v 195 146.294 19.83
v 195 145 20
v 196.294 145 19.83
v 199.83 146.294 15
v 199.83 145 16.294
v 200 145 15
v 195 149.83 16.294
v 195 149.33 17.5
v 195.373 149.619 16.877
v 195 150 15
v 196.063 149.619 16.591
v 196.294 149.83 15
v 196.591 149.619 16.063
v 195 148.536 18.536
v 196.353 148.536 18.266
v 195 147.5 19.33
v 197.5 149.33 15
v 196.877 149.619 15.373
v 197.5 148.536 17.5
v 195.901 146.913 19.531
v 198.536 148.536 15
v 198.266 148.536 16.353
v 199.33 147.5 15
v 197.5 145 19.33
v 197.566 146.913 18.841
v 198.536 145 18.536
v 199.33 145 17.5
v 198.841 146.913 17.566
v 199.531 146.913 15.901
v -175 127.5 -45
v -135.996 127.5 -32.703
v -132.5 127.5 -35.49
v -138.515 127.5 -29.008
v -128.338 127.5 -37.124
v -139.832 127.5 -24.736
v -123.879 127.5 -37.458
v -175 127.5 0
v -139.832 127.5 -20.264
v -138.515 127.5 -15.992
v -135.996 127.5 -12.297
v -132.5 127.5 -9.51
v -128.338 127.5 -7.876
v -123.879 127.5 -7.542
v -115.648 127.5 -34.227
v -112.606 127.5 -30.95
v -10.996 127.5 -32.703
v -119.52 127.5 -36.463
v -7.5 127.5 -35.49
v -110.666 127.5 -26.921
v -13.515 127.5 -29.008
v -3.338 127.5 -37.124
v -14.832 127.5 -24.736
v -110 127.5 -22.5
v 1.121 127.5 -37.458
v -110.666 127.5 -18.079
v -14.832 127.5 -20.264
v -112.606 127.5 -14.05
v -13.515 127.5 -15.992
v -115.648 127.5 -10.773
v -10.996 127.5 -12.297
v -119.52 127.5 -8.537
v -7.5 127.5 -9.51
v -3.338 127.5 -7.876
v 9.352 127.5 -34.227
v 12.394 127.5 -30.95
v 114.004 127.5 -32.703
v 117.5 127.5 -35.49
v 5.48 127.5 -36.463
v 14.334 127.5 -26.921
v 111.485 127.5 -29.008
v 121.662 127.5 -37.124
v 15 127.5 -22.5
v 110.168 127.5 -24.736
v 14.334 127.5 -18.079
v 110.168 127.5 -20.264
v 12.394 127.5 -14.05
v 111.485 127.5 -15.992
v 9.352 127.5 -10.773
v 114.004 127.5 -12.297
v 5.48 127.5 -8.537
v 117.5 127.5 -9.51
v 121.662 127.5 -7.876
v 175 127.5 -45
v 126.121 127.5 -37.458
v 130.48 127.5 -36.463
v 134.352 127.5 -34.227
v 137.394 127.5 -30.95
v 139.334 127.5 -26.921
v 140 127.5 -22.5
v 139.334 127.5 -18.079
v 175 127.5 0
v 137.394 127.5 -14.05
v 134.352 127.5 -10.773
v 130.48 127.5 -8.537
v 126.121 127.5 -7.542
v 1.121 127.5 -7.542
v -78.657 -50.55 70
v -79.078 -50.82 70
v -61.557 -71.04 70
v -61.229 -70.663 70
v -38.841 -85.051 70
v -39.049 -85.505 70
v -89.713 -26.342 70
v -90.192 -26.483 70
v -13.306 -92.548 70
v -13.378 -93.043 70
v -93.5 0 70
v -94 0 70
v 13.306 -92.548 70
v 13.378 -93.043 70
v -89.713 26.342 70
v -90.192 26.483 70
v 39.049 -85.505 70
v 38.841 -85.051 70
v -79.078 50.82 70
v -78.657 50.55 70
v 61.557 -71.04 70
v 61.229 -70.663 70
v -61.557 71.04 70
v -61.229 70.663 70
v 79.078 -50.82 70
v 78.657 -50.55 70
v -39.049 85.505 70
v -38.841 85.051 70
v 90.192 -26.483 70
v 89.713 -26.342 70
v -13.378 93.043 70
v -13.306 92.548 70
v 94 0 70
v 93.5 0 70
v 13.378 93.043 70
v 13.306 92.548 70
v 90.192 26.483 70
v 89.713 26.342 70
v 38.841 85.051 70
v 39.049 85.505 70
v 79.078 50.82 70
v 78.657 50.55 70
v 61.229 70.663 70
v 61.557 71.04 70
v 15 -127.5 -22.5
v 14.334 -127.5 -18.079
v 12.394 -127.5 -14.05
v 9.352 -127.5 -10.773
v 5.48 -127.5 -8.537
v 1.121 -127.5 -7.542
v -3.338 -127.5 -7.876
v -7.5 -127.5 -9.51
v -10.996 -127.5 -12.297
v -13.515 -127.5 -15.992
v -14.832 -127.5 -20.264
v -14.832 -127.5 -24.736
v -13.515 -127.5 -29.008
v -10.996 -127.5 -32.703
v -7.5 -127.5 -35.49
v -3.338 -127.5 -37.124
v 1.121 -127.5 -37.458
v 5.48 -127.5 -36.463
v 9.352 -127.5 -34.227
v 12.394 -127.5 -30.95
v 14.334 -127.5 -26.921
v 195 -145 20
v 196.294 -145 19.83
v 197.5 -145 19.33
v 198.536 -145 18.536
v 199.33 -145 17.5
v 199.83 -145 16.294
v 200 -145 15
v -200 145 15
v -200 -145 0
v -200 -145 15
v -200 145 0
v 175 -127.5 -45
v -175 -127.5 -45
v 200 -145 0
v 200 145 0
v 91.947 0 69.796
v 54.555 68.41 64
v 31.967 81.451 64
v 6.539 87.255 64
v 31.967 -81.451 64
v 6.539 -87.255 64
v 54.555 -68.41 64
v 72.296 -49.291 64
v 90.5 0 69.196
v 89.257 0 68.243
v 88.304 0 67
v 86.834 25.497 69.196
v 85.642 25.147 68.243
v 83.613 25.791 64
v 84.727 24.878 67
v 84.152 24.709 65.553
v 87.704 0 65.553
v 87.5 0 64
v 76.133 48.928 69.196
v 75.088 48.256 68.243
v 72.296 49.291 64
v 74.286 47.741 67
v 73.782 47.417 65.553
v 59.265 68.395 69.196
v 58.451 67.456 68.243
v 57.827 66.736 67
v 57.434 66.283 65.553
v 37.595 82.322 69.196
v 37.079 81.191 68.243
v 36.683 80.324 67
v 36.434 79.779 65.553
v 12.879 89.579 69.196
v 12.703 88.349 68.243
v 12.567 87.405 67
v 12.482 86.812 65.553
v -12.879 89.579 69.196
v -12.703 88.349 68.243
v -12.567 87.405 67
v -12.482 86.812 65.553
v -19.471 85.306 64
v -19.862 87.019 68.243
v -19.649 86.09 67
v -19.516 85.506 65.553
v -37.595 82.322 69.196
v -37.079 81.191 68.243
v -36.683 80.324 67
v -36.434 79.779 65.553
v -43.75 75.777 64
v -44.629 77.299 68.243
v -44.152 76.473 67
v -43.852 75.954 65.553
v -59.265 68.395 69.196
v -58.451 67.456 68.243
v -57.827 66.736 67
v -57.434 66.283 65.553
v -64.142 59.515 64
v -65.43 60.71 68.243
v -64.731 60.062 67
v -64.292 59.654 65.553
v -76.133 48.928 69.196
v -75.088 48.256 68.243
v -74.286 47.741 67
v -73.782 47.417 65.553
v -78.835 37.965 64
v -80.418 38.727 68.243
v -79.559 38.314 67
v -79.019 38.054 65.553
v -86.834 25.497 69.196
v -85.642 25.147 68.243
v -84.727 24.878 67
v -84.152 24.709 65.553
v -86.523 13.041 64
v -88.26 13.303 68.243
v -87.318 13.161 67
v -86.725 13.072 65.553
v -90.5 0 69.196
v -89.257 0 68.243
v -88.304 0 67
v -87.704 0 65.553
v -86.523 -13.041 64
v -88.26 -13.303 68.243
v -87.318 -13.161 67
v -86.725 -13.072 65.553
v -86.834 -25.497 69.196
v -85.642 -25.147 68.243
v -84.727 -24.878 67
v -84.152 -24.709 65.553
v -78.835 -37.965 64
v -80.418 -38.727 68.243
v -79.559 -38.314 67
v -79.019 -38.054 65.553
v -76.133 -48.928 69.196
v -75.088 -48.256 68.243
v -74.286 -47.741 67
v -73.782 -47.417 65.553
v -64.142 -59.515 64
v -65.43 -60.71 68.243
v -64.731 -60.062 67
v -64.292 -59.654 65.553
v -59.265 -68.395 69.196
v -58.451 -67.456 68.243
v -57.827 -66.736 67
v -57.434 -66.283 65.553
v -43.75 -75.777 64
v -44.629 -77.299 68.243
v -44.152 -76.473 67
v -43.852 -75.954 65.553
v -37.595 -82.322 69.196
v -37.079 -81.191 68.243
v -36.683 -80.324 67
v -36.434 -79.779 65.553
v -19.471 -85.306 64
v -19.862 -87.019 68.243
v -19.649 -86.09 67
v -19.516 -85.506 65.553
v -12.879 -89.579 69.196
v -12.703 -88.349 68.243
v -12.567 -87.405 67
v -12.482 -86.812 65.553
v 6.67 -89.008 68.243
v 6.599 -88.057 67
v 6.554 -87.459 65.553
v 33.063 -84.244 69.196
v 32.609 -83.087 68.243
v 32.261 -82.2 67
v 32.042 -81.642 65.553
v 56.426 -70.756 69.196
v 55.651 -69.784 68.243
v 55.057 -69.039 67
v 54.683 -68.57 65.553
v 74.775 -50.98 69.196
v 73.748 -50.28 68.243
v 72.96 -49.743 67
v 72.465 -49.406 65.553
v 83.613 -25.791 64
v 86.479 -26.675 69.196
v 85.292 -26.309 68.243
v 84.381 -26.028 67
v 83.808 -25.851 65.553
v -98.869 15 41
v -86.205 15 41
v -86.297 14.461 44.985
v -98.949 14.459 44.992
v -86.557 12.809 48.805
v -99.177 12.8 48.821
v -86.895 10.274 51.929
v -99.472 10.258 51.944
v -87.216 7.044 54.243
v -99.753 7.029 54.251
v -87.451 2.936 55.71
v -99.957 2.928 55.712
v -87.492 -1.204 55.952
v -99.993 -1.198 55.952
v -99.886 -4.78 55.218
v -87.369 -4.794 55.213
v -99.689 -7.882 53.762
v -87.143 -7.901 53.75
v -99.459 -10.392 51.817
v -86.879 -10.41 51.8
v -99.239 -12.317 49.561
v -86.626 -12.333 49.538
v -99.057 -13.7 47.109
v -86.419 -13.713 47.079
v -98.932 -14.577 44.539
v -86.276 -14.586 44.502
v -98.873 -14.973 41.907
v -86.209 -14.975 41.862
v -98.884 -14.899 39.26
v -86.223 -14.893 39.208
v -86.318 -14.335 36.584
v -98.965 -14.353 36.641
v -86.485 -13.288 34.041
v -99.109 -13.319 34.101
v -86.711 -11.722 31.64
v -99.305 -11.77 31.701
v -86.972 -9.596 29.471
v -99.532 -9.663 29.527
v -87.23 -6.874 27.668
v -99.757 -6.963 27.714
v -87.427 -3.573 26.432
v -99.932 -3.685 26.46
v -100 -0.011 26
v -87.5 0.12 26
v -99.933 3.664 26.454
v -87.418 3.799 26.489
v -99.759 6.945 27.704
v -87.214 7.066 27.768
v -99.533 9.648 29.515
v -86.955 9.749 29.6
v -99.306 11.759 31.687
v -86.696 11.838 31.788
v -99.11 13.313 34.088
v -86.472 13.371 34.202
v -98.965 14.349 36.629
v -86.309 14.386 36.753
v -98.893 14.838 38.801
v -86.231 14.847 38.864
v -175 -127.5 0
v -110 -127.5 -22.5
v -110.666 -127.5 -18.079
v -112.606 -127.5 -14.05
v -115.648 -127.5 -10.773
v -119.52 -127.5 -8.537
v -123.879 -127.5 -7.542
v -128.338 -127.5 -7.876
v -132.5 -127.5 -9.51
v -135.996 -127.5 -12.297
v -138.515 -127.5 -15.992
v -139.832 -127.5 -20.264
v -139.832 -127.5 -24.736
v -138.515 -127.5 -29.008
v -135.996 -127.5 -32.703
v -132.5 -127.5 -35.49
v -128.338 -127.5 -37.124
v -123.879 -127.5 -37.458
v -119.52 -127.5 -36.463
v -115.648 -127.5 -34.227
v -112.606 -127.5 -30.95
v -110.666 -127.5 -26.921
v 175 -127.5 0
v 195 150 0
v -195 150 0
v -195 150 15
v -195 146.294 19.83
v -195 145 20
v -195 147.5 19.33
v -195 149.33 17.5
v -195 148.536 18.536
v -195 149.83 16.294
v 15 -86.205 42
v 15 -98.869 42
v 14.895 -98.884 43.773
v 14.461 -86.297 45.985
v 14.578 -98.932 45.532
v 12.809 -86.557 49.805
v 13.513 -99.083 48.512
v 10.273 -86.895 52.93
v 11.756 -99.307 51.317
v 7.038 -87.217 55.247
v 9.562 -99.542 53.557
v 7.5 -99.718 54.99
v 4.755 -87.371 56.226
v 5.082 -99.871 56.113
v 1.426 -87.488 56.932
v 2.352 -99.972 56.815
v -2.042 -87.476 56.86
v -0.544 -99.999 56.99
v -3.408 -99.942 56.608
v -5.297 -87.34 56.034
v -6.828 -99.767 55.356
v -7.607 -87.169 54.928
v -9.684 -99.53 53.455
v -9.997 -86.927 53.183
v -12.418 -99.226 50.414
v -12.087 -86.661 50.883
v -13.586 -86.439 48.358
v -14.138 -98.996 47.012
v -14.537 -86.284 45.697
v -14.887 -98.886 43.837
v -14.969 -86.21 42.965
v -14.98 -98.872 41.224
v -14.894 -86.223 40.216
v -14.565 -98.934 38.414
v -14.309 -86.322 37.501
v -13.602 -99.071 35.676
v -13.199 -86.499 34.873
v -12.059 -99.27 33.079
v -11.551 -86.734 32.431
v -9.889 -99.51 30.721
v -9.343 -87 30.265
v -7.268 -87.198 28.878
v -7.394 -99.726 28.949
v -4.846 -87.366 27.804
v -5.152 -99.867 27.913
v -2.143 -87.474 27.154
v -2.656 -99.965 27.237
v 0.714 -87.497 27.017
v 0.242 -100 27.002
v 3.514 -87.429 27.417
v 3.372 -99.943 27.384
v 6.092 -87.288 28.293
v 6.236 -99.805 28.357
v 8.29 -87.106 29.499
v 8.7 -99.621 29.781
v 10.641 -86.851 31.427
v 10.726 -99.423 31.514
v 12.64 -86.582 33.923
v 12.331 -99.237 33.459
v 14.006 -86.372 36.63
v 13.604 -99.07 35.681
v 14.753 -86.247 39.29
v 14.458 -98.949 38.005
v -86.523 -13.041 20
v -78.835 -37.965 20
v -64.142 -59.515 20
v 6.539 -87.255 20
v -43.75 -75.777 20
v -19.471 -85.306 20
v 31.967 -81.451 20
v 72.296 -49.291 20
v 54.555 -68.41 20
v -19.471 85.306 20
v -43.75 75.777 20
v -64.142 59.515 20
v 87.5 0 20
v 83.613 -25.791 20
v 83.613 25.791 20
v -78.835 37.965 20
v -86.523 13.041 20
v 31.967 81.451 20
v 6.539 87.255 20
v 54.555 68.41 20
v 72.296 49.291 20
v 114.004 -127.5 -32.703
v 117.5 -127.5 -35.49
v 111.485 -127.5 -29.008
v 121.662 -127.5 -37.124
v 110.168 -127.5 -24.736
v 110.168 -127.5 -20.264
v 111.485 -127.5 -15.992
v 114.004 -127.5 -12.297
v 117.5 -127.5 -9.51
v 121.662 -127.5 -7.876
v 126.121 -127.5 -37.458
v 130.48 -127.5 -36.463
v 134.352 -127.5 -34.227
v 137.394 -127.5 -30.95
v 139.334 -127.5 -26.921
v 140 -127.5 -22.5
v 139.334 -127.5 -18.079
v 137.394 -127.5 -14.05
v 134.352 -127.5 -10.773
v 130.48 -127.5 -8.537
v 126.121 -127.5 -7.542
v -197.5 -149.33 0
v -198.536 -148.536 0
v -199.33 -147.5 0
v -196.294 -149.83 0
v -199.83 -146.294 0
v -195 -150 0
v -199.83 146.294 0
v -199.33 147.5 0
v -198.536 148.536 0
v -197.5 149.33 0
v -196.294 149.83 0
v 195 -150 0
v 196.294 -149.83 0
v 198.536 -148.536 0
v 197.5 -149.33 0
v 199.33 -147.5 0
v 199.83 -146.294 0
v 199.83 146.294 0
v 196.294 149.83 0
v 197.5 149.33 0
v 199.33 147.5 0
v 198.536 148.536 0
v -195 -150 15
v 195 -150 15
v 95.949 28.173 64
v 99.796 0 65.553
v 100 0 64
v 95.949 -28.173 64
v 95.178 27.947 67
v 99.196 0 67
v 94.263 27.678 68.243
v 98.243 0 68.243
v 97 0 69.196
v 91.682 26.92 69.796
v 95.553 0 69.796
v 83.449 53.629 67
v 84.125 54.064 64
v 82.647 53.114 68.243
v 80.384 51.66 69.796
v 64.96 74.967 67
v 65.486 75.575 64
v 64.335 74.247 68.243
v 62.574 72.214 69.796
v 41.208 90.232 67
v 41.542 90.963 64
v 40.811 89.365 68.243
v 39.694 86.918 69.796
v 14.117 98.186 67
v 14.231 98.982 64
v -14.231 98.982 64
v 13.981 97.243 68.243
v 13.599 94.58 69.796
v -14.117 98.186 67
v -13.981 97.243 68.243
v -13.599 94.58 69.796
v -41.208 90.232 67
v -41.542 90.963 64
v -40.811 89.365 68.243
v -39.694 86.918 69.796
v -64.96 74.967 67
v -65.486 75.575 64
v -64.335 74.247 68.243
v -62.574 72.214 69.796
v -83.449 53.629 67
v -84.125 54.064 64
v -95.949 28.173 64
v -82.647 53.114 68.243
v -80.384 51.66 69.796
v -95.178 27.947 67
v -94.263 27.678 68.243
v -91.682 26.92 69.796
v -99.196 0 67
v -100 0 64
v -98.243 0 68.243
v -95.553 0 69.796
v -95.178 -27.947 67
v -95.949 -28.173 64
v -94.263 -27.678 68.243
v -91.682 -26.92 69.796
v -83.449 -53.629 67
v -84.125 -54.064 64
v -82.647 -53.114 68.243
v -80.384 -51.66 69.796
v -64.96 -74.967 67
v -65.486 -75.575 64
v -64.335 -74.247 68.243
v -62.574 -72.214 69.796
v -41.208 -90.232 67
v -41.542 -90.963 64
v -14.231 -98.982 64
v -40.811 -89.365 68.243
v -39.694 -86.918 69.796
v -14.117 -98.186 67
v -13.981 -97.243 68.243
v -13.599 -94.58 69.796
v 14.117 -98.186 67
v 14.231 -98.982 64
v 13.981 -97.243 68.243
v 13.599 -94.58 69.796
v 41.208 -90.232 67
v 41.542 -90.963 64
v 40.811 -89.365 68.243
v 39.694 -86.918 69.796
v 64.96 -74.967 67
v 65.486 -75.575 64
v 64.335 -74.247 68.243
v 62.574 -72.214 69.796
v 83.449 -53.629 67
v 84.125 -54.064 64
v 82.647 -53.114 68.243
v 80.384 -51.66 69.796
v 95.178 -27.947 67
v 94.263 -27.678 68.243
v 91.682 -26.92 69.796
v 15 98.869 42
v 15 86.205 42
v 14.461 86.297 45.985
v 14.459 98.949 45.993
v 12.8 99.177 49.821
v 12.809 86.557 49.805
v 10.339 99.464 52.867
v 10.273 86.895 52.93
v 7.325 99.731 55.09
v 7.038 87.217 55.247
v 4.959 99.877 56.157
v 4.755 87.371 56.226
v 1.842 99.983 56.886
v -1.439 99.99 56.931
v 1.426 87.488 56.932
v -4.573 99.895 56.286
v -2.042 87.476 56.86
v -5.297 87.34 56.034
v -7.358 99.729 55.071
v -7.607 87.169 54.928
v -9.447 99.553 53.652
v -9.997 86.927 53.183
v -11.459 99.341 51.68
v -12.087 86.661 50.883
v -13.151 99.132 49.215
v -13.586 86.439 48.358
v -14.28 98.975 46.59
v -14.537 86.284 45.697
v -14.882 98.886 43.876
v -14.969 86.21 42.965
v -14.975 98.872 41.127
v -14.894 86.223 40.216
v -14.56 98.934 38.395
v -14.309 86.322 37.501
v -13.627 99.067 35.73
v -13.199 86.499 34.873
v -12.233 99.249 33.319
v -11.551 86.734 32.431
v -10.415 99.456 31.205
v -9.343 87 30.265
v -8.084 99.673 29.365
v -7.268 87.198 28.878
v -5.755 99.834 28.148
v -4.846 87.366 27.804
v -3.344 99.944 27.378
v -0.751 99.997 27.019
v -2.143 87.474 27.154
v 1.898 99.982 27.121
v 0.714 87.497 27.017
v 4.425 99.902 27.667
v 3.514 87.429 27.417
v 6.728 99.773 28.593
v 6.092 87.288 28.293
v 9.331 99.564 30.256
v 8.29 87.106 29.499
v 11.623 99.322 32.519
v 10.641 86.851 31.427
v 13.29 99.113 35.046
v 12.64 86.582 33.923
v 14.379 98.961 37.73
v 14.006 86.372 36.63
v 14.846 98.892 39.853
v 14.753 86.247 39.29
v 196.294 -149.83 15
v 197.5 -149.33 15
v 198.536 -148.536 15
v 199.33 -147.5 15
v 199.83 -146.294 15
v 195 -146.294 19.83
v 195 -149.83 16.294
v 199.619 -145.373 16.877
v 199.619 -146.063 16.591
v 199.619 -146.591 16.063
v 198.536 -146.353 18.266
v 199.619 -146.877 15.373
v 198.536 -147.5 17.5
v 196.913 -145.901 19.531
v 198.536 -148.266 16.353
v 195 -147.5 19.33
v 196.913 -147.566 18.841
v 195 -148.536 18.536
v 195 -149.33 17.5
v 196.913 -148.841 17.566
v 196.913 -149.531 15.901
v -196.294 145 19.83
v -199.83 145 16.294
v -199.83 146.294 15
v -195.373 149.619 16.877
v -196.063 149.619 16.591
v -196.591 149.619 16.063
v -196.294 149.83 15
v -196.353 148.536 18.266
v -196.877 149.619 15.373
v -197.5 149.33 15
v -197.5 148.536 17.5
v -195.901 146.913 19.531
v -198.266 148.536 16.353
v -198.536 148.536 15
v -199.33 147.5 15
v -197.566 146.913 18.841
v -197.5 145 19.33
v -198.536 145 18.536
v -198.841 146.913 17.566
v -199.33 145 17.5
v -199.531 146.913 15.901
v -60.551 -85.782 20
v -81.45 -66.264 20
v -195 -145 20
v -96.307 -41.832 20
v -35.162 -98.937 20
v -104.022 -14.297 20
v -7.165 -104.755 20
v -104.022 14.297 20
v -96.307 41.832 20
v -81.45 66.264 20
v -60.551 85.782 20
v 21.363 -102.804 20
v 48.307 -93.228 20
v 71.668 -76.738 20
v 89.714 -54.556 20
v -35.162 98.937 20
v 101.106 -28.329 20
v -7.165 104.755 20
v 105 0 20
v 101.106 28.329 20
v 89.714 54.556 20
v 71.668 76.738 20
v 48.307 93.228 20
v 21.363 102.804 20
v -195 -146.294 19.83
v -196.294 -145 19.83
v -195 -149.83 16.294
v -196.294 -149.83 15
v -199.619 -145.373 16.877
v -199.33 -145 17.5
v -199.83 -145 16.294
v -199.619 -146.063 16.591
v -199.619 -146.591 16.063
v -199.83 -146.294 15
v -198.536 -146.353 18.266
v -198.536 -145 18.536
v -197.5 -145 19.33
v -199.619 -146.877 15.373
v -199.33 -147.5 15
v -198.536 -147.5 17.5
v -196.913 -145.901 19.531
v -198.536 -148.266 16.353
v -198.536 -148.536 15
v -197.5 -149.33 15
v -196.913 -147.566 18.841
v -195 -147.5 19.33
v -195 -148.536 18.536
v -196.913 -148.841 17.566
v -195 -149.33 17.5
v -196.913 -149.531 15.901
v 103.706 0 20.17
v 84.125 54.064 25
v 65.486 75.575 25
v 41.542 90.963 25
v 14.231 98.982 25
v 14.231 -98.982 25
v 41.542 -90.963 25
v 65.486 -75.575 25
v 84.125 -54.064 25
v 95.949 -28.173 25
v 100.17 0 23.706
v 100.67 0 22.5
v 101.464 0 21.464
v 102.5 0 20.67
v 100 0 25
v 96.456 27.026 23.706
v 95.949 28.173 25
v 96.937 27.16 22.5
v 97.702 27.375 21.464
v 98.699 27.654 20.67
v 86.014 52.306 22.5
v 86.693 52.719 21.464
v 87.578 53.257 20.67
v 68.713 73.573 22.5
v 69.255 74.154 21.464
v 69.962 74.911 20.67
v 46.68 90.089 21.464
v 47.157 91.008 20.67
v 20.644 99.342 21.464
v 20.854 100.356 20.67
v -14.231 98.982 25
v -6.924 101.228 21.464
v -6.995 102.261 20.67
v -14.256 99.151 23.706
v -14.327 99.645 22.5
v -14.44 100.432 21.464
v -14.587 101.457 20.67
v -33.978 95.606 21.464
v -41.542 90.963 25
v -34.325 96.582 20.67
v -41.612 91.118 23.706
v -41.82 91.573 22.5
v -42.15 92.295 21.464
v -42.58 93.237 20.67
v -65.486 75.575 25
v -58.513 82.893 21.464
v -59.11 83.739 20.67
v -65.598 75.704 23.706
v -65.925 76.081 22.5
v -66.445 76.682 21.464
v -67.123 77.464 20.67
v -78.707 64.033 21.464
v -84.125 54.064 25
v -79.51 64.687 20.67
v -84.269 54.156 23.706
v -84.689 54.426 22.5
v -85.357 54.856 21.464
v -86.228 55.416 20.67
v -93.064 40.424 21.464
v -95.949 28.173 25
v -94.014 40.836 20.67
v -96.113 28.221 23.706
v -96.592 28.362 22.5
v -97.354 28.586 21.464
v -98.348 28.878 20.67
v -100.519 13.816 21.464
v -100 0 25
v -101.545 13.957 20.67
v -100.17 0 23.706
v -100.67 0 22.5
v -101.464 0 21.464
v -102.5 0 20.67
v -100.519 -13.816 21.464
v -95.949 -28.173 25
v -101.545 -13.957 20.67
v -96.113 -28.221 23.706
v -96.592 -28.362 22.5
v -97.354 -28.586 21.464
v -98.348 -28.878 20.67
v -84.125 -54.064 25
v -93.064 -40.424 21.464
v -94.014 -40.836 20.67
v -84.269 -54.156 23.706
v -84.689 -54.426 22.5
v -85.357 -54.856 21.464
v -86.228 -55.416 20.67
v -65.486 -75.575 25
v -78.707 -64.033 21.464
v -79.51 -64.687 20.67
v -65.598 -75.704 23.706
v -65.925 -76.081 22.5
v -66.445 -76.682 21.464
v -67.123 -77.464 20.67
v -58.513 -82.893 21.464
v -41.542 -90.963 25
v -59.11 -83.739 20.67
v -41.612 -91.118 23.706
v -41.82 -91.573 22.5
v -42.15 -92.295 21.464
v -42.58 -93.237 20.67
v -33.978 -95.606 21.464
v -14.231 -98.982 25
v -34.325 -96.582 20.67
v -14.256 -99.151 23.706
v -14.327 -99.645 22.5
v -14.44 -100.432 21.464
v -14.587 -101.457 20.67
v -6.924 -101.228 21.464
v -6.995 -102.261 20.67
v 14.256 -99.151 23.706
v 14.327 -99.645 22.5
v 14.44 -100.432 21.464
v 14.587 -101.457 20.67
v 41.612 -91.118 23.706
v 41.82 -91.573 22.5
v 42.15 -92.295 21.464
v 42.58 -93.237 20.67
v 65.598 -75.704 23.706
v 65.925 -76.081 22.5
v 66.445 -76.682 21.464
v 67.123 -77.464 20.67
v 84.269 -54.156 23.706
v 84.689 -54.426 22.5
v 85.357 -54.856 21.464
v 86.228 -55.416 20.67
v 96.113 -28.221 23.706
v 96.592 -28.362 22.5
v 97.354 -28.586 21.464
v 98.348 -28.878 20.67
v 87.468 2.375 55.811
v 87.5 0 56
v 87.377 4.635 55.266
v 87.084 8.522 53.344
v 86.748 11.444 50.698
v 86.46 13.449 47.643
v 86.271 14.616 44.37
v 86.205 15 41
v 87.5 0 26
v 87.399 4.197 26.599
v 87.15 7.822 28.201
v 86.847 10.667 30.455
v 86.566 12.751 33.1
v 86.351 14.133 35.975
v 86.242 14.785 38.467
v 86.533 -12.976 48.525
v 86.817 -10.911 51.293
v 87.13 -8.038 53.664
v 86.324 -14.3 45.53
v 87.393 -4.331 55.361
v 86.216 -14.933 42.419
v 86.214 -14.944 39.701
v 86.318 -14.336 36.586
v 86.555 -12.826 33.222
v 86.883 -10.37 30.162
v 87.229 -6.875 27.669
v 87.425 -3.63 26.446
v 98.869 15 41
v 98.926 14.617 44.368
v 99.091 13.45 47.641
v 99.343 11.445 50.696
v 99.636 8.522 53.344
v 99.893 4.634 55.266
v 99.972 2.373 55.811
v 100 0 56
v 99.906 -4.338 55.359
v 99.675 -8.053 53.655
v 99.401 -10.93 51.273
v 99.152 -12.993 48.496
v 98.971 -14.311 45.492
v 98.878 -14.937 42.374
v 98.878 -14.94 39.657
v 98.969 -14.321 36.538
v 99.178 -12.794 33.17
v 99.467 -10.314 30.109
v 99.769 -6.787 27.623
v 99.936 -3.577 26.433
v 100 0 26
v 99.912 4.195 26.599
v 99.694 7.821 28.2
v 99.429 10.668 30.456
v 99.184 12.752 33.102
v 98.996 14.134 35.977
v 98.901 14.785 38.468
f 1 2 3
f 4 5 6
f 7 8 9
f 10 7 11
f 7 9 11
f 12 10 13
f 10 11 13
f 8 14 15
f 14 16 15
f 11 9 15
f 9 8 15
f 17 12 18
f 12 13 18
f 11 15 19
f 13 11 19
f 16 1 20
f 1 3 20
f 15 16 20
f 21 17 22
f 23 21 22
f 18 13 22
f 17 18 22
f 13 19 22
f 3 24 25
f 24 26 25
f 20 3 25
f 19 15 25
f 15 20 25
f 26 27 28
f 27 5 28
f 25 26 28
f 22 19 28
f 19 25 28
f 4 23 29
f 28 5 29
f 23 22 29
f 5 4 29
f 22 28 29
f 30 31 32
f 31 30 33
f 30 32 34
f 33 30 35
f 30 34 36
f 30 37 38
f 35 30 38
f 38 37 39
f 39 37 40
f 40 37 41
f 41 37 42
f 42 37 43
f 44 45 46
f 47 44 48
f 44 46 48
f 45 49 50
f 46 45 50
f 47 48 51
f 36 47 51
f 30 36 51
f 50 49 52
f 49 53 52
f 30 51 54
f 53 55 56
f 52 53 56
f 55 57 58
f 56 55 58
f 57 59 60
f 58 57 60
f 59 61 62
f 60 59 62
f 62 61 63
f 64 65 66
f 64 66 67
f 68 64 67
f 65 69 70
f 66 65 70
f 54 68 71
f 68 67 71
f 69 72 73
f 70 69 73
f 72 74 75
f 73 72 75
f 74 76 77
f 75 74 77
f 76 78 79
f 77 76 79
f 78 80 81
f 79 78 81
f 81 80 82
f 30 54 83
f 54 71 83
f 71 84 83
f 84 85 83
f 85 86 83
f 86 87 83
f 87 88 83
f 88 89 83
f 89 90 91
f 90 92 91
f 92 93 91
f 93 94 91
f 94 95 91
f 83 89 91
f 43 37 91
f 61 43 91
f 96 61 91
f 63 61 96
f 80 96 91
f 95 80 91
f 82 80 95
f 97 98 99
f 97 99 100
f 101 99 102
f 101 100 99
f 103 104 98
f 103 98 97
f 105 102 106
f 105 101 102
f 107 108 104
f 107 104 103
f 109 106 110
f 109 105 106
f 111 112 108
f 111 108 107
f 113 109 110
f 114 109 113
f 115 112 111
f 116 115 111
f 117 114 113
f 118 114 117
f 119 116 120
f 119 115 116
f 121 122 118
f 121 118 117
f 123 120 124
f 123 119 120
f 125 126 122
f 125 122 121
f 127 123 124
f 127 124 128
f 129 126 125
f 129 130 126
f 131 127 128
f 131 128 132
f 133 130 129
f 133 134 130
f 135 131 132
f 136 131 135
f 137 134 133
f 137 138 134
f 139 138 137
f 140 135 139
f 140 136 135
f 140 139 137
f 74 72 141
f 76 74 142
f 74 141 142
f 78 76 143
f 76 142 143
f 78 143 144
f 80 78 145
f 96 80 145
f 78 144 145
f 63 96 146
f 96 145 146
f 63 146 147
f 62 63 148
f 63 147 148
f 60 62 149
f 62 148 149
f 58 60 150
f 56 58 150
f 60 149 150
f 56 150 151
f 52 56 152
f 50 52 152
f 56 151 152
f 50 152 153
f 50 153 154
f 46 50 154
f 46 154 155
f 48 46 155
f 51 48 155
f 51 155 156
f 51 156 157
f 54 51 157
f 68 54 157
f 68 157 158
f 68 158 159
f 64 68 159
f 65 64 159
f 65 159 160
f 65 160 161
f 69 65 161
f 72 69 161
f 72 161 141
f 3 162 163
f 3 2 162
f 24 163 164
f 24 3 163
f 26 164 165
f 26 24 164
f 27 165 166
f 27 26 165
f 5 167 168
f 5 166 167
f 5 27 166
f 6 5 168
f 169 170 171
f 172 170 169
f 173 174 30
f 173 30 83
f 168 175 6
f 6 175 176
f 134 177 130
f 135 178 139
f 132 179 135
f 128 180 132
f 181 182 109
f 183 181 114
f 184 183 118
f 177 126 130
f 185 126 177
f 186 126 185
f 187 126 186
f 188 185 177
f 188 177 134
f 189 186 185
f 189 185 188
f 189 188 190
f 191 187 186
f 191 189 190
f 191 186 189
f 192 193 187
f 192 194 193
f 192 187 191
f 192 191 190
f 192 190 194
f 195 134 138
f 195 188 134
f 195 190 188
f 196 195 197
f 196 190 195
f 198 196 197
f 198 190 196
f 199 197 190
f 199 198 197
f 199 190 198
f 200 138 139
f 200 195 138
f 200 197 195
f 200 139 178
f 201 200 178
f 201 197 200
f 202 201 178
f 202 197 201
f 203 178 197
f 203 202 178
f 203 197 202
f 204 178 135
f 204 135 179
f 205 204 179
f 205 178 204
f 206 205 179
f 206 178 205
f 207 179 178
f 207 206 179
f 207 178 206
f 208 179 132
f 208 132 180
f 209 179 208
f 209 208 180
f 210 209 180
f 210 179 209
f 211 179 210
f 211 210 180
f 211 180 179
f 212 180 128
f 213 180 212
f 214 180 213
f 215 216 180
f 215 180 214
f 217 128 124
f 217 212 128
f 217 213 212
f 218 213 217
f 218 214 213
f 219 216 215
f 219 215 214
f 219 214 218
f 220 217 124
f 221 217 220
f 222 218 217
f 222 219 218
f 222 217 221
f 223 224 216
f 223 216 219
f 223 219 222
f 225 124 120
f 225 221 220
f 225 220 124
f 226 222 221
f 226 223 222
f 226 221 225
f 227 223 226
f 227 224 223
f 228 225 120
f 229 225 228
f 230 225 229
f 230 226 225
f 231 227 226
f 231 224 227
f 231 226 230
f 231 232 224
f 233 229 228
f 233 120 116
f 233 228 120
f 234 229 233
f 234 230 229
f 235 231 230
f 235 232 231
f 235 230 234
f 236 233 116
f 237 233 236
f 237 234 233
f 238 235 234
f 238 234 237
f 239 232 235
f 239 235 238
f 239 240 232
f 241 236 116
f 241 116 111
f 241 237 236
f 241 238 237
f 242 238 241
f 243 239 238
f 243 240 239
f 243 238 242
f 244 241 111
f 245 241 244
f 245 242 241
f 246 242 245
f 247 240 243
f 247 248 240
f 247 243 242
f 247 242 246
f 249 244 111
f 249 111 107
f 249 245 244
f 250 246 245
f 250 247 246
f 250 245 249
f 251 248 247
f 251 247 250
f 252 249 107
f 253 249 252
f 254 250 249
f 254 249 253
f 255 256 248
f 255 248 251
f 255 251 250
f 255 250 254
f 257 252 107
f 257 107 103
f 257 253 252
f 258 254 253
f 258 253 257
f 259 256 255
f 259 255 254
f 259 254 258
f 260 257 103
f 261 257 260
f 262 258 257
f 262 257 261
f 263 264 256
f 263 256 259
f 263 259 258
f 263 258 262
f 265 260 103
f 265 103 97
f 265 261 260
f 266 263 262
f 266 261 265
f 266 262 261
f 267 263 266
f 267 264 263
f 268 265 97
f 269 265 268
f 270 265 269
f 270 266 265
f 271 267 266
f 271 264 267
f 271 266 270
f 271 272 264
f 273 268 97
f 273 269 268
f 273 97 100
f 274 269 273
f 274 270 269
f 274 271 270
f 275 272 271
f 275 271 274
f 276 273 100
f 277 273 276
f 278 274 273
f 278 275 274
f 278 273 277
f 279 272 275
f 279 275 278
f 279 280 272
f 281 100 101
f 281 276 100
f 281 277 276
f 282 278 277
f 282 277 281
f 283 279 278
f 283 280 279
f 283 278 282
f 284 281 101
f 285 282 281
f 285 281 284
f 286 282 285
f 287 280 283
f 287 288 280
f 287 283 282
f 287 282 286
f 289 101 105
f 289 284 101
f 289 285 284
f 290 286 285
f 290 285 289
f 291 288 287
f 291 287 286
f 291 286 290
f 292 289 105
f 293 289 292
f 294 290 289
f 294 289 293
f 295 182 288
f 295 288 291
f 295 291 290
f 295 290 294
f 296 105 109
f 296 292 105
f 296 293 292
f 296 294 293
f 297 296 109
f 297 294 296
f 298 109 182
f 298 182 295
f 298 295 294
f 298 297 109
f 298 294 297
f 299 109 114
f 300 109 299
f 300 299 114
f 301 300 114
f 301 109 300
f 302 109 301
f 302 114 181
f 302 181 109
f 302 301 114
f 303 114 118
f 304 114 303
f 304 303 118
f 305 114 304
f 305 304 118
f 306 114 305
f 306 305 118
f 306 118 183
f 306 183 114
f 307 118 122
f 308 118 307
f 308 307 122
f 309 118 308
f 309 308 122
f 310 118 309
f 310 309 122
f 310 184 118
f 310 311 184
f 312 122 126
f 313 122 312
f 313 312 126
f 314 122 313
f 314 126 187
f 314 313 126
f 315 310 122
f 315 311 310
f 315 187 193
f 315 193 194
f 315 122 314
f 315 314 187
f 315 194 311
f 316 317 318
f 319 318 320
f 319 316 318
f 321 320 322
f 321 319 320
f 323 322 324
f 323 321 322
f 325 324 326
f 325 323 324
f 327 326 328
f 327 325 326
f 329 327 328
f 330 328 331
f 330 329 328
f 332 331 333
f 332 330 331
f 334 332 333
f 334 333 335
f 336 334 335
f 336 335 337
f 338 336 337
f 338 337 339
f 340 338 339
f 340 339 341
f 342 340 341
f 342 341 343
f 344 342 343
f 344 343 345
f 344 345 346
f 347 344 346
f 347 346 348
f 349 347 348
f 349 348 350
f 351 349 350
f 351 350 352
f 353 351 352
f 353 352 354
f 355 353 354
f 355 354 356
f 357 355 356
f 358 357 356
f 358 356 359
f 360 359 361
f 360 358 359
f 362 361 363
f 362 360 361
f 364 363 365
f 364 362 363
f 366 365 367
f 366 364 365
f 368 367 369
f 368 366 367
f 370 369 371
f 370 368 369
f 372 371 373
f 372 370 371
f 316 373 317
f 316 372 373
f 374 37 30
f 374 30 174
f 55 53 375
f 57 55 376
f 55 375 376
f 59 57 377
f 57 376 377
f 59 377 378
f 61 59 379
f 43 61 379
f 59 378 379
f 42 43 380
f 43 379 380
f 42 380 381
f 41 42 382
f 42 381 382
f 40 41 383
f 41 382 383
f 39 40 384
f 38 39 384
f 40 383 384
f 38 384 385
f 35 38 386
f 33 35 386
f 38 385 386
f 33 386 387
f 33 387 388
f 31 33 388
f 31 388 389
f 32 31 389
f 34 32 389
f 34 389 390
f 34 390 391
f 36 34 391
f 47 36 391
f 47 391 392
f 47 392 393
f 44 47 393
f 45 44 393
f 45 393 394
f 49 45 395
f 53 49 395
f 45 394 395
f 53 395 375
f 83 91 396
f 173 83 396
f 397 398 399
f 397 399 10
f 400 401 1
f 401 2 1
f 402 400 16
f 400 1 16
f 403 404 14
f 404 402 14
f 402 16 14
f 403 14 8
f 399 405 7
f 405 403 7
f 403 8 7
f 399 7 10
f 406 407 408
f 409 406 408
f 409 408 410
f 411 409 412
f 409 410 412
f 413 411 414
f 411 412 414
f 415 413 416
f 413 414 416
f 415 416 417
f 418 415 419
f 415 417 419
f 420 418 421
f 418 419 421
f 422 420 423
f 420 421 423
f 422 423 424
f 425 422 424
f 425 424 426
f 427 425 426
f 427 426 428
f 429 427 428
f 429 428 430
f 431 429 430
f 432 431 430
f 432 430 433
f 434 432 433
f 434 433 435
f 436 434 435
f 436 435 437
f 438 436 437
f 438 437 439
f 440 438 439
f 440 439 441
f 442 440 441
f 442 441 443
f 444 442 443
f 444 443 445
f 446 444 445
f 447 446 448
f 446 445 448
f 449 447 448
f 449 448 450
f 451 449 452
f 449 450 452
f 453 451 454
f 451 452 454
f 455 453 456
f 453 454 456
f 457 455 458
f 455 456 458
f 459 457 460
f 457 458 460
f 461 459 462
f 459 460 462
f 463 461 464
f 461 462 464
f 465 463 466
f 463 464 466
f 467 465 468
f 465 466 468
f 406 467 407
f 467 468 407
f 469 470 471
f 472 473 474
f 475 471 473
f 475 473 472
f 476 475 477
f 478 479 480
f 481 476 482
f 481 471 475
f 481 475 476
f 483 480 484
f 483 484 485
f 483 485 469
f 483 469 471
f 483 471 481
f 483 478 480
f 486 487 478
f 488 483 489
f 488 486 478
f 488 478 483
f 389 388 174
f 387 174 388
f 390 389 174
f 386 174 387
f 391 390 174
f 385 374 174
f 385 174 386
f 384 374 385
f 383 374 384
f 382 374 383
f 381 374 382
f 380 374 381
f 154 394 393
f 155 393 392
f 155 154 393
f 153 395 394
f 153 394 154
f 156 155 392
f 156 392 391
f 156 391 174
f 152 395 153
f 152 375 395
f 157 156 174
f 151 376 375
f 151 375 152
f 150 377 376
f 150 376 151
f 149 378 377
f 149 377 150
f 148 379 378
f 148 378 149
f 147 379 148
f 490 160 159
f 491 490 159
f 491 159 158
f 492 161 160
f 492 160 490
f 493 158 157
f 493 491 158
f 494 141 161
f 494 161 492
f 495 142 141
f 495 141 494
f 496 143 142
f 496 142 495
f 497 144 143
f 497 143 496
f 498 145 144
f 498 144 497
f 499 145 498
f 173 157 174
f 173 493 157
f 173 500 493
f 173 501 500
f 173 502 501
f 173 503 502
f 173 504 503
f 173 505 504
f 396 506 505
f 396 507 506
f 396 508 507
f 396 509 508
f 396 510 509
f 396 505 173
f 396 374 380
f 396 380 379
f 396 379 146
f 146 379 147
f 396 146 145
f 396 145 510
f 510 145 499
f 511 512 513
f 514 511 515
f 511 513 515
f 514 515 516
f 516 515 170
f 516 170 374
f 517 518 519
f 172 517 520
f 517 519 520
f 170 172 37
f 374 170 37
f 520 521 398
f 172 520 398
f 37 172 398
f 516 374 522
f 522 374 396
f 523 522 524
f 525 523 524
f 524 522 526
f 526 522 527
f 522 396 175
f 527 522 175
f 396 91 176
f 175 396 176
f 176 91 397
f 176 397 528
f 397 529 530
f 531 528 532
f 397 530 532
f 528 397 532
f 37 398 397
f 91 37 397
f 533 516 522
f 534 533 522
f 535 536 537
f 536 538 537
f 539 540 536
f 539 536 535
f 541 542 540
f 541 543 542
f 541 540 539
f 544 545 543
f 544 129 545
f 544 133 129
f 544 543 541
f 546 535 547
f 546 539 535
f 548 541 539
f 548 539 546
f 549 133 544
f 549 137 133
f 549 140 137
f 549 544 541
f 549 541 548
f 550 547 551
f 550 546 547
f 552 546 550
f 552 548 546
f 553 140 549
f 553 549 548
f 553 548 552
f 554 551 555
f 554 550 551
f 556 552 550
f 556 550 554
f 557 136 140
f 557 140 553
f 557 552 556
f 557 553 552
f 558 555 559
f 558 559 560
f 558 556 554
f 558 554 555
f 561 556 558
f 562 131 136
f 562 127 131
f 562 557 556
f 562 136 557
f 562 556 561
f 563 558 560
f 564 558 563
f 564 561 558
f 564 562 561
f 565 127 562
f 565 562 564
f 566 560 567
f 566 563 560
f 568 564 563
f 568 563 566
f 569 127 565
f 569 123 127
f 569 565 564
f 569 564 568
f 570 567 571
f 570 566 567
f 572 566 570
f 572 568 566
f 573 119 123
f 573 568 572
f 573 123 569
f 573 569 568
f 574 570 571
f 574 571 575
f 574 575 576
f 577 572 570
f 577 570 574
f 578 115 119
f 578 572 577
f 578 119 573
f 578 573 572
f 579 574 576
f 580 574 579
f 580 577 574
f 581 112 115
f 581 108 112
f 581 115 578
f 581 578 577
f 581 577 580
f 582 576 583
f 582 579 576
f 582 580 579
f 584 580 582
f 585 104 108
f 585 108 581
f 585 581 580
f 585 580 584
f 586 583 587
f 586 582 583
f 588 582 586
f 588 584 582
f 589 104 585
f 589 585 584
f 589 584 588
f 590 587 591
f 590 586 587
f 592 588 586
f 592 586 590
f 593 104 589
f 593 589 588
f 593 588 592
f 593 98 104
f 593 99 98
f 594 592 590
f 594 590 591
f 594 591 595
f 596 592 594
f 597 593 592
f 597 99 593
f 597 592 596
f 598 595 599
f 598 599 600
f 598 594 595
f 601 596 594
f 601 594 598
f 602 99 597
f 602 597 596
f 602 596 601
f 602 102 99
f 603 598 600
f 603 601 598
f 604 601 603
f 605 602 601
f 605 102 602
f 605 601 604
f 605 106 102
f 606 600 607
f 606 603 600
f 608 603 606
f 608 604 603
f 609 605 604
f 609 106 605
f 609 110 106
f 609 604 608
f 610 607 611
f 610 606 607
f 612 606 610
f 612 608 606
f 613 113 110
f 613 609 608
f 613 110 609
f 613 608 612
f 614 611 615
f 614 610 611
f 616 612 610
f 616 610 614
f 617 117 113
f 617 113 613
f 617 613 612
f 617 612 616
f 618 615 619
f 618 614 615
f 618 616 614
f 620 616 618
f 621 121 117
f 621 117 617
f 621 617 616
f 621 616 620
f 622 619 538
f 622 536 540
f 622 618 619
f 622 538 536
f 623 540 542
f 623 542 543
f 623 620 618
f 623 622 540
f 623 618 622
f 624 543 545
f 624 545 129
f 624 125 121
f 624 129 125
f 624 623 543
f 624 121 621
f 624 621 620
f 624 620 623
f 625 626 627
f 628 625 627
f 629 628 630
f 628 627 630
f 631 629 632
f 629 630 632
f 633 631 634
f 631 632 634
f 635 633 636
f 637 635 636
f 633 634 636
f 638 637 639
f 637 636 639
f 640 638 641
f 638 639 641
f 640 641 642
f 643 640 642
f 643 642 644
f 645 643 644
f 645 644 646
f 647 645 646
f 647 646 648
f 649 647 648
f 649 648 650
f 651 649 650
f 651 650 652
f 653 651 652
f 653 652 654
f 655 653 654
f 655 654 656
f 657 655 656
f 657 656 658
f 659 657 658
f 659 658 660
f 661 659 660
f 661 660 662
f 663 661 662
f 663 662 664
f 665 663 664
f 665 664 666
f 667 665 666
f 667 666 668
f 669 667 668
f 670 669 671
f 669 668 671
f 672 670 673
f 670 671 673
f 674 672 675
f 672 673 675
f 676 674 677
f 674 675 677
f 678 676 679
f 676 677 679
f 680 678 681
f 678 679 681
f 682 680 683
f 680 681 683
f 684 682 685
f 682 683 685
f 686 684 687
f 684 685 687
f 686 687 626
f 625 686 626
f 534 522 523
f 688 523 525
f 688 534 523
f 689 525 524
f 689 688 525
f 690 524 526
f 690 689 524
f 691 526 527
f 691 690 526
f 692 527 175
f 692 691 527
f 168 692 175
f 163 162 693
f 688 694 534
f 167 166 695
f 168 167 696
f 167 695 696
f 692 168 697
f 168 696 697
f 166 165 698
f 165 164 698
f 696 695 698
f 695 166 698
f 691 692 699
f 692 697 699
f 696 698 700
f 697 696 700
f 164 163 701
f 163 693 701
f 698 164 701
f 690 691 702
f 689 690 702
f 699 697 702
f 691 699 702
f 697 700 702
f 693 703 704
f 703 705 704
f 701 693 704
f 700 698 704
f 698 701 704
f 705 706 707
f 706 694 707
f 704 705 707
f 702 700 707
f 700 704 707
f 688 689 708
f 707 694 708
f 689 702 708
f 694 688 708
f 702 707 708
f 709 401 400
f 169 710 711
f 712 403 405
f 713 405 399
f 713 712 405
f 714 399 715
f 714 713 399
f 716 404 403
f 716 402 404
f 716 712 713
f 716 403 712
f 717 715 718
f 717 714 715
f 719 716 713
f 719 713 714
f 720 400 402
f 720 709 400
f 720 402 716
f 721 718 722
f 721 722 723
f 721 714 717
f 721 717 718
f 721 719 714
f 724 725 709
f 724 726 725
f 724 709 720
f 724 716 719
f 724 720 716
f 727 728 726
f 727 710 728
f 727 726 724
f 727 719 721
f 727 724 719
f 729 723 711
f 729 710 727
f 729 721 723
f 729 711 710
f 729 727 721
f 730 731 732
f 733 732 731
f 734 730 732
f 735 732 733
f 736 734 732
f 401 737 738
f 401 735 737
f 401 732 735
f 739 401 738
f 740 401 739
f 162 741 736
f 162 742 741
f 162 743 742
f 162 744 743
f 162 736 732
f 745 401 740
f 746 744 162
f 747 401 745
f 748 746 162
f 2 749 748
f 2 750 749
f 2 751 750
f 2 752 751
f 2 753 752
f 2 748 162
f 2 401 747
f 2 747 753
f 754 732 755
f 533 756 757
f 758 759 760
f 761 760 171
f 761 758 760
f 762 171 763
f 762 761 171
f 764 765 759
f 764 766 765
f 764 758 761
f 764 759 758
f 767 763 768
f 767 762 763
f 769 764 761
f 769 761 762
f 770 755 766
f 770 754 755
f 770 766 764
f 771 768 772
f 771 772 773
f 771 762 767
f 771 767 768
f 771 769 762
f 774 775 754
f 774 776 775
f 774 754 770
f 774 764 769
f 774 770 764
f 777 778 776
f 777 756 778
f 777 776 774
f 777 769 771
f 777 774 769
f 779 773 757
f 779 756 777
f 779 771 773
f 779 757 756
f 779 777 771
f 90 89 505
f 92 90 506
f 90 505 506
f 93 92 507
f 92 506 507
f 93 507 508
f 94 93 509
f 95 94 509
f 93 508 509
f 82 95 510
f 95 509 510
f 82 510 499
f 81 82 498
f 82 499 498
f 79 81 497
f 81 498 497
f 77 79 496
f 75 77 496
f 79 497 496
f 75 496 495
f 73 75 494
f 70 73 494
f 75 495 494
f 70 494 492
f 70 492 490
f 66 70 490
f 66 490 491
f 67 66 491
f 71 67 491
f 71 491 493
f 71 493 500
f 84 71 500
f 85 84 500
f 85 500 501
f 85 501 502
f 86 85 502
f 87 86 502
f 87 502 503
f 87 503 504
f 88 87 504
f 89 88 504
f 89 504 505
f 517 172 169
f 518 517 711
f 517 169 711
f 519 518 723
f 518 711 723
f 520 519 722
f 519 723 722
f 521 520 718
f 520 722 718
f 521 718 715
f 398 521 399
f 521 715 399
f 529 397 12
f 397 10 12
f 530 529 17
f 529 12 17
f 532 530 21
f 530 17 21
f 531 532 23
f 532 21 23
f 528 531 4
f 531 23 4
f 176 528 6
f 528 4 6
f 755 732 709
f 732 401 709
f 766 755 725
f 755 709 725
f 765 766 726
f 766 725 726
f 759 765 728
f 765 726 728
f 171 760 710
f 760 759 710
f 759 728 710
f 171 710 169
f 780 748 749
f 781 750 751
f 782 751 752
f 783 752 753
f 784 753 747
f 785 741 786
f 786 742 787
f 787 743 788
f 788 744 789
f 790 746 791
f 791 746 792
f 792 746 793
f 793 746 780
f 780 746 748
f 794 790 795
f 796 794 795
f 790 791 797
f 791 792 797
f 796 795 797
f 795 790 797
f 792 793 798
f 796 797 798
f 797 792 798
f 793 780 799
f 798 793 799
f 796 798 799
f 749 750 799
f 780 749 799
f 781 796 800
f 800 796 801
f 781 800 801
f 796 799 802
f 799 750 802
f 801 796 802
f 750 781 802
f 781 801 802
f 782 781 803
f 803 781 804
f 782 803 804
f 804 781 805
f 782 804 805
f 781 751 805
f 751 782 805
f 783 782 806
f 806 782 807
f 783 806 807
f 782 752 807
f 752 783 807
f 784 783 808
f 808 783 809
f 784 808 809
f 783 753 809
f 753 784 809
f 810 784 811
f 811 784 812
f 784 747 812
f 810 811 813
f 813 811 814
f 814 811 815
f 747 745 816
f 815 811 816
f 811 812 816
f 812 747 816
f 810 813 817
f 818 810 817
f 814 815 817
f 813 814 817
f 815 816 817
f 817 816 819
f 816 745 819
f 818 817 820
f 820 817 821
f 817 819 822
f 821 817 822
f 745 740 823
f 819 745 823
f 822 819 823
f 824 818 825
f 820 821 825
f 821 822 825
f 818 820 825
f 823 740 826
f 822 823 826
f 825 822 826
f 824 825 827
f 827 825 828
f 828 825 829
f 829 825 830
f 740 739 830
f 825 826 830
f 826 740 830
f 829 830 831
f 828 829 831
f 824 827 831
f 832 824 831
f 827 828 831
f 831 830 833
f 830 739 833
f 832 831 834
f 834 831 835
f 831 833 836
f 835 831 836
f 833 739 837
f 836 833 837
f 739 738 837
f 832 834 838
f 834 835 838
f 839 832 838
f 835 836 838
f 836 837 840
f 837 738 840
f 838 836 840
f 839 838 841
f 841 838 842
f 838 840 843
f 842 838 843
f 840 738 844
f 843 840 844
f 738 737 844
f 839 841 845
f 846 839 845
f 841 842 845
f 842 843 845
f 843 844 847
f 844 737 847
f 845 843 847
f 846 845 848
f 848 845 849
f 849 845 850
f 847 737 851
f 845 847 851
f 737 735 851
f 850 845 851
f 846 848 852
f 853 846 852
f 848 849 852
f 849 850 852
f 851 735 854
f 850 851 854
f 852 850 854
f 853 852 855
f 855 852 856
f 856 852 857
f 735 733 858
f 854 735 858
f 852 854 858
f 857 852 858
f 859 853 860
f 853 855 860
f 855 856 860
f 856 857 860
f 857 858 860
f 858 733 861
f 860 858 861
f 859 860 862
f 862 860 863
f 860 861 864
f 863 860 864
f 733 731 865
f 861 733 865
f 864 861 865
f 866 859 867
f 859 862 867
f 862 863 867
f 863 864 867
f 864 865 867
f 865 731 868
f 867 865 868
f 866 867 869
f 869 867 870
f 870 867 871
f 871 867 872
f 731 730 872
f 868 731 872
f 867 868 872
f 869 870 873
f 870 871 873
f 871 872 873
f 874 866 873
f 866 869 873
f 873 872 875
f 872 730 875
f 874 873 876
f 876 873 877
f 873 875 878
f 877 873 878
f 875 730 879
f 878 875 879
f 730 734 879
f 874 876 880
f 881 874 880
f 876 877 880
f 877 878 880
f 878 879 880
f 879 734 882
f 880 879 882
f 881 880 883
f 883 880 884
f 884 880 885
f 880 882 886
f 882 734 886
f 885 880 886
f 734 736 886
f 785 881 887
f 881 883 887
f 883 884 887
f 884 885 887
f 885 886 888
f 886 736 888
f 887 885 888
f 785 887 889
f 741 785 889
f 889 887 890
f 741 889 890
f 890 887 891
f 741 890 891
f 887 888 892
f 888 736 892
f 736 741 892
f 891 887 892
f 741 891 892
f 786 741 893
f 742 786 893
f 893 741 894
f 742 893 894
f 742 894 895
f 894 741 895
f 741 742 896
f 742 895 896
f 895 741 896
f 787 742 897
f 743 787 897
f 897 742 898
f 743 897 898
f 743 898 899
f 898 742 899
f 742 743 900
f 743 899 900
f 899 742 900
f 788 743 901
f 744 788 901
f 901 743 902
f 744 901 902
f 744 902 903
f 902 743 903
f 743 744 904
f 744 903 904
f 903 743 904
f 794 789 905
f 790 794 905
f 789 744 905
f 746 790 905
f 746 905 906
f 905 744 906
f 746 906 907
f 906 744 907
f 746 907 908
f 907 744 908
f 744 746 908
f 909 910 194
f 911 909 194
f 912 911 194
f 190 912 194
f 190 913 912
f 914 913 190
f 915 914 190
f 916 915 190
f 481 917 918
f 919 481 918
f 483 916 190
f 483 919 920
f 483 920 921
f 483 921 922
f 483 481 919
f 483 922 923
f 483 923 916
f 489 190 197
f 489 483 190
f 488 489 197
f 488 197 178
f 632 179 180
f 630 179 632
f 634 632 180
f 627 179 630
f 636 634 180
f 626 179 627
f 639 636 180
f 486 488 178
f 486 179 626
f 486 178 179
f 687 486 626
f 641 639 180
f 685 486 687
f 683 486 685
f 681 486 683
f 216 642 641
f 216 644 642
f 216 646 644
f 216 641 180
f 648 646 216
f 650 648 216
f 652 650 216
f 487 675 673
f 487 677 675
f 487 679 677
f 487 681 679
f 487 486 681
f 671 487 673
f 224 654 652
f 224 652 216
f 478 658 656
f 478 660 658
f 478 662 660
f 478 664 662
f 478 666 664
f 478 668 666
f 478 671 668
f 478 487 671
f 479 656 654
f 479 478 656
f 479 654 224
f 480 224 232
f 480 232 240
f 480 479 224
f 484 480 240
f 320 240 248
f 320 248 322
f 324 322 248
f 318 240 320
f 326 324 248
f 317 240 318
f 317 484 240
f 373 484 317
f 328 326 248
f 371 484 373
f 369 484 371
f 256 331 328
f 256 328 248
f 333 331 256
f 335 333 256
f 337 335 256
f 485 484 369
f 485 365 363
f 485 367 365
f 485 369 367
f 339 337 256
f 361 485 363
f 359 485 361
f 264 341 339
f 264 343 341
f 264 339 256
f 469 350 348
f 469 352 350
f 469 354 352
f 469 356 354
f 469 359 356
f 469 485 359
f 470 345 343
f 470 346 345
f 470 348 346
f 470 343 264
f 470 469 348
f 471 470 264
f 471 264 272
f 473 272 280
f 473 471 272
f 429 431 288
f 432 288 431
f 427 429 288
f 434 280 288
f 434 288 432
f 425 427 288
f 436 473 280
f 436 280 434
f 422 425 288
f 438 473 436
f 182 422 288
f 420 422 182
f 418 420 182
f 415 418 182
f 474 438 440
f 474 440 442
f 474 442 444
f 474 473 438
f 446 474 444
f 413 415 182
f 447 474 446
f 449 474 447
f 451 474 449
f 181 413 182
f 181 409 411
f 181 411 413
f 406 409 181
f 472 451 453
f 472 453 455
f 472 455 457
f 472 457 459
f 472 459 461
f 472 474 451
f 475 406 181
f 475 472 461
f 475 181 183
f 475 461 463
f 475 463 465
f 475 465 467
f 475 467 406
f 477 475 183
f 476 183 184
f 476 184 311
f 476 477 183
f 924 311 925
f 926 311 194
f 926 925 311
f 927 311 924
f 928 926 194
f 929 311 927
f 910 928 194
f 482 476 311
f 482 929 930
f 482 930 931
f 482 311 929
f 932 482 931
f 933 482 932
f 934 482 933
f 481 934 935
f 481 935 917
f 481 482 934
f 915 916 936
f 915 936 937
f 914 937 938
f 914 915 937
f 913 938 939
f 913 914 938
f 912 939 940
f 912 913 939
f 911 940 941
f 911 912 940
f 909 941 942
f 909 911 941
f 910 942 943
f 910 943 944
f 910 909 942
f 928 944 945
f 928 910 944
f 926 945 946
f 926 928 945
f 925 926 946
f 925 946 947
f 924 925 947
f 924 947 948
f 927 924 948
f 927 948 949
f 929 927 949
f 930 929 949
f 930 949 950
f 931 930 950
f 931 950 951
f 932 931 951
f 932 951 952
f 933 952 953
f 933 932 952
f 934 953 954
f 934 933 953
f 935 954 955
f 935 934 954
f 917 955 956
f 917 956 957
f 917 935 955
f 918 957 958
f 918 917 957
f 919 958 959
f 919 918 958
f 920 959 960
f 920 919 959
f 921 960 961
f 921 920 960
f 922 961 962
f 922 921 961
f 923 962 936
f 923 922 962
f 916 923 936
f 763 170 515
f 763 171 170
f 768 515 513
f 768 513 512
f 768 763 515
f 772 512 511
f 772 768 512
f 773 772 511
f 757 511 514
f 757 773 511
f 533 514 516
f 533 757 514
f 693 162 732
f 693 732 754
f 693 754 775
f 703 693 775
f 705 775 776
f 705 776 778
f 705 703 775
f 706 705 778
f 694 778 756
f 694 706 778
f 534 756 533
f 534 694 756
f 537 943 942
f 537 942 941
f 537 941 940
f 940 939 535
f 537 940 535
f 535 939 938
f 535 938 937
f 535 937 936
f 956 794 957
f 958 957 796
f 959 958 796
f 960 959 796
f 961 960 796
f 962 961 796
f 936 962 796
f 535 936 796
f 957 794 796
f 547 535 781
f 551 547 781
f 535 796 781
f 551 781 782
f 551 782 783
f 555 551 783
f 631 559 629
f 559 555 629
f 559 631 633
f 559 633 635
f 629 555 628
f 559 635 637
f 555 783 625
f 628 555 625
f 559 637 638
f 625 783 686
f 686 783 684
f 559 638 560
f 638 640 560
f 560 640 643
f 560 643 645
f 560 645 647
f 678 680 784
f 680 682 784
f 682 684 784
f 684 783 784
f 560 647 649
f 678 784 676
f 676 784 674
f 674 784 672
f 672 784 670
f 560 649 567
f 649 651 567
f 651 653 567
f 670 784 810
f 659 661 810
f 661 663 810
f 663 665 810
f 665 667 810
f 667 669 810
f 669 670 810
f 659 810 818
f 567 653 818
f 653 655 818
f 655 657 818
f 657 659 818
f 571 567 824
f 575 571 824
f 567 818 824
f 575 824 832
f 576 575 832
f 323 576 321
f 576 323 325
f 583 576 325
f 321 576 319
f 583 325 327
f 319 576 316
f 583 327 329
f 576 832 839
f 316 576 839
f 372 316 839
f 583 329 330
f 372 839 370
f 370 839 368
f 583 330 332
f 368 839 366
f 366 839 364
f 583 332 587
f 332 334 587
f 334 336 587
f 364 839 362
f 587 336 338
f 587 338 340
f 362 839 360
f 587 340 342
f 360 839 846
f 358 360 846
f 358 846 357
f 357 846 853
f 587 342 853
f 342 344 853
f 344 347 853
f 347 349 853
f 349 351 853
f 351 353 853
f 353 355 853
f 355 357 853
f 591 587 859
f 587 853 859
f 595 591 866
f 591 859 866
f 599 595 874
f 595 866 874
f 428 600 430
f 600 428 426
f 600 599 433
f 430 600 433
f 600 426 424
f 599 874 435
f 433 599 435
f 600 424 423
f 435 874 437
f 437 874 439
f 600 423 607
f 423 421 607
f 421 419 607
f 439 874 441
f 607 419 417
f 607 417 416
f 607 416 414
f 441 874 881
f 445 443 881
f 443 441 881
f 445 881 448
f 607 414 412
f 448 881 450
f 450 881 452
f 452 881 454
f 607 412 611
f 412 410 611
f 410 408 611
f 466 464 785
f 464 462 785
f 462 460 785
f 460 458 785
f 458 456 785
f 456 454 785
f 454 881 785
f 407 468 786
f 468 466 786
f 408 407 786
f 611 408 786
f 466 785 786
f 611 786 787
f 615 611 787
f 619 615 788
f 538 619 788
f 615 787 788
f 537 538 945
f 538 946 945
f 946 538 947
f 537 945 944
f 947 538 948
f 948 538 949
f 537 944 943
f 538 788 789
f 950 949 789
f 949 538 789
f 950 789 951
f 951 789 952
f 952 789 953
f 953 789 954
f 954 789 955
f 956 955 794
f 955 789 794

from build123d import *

# Parameters (mm, degrees)
F0_W      = 400
F0_H      = 300
F1_DEPTH  = 20
F2_R      = 100
F2_R_2    = 87.5
F3_DEPTH  = 50
F4_R      = 6
F6_R      = 15
F7_DEPTH  = 200
F9_R      = 15
F10_DEPTH = 200
F11_W     = 350
F11_H     = 255
F12_DEPTH = 45
F13_R     = 15
F14_DEPTH = 255
F15_DEPTH = 256
F16_R     = 5


with BuildPart() as f1:
    # F0 (on Top) → F1 (new body)
    with BuildSketch(Plane.XY):
        Rectangle(F0_W, F0_H)
    extrude(amount=F1_DEPTH)

    # F2 (on face) → F3 (join)
    with BuildSketch(Plane.XY.offset(20)):
        Circle(F2_R)
        Circle(F2_R_2, mode=Mode.SUBTRACT)
    extrude(amount=F3_DEPTH)

    # F4
    f4_edges = [f1.edges().sort_by_distance(p)[0] for p in [
        (-100, 0, 70),
        (-87.5, 0, 70),
    ]]
    fillet(f4_edges, radius=F4_R)

    # F6 (on offset) → F7 (cut)
    with BuildSketch(Plane.XZ.offset(100)):
        with Locations((0, 42)):
            Circle(F6_R)
    extrude(amount=-F7_DEPTH, mode=Mode.SUBTRACT)

    # F9 (on offset) → F10 (cut)
    with BuildSketch(Plane.YZ.offset(-100)):
        with Locations((0, 41)):
            Circle(F9_R)
    extrude(amount=F10_DEPTH, mode=Mode.SUBTRACT)

    # F11 (on face) → F12 (join)
    with BuildSketch(Plane(origin=(0, 0, 0), x_dir=(1, 0, 0), z_dir=(0, 0, -1))):
        Rectangle(F11_W, F11_H)
    extrude(amount=F12_DEPTH)

    # F13 (on face) → F14 (cut)
    with BuildSketch(Plane.XZ.offset(127.5)):
        with Locations((-125, -22.5)):
            Circle(F13_R)
    extrude(amount=-F14_DEPTH, mode=Mode.SUBTRACT)

    # F13 (on face) → F15 (cut)
    with BuildSketch(Plane.XZ.offset(127.5)):
        with Locations((-125, -22.5)):
            Circle(F13_R)
        with Locations((125, -22.5)):
            Circle(F13_R)
        with Locations((0, -22.5)):
            Circle(F13_R)
    extrude(amount=-F15_DEPTH, mode=Mode.SUBTRACT)

    # F16
    f16_edges = [f1.edges().sort_by_distance(p)[0] for p in [
        (0, -150, 20),
        (-200, 0, 20),
        (200, 0, 20),
        (0, 150, 20),
        (-100, 0, 20),
        (-200, -150, 10),
        (200, -150, 10),
        (200, 150, 10),
        (-200, 150, 10),
    ]]
    fillet(f16_edges, radius=F16_R)


solid = f1.part
